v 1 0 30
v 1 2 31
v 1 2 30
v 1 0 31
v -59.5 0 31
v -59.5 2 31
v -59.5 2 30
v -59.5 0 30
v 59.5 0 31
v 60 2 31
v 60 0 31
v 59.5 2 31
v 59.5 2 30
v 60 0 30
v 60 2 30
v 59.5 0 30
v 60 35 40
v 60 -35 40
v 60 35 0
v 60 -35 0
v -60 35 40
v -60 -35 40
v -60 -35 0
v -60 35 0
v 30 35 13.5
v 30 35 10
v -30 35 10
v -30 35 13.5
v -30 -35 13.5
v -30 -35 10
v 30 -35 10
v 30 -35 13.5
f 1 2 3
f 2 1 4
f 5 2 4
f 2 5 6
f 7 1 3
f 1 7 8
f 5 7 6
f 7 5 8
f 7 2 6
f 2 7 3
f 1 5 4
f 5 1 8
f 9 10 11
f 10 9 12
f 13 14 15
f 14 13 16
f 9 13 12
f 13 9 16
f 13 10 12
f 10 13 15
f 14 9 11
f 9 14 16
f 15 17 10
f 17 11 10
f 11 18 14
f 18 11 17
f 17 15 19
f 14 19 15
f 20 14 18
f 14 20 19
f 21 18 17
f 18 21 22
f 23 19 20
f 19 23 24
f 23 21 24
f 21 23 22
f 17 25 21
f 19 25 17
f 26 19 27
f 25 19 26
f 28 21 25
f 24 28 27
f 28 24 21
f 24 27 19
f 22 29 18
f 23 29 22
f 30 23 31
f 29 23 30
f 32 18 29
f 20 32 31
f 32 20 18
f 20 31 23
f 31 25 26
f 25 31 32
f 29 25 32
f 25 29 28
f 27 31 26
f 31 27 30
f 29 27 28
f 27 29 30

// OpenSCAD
// Mini horizontal gel-electrophoresis box - buffer tank
// Print orientation: open top facing up (+Z), resting on XY plane at z = 0

// ---------------- Parameters ----------------
tank_x      = 120;   // outer length along X (mm)
tank_y      = 70;    // outer width along Y (mm)
tank_h      = 40;    // outer height along Z (mm)

wall        = 3;     // wall thickness (mm)
floor       = 3;     // floor thickness (mm)

platform_x  = 60;    // platform length along X (mm), centred
platform_y  = tank_y; // platform spans full inner width (mm)
platform_top = 13;   // platform top height above tank floor (mm)
// Note: platform_top is absolute height in the model (floor is at z = 0)

hole_d      = 2;     // electrode hole diameter (mm)
hole_y      = 0;     // electrode hole Y position (mm)
hole_z      = 30;    // electrode hole Z position (mm)

eps         = 0.5;   // cutter overshoot past faces (mm)

$fn = 96;

// ---------------- Derived ----------------
inner_x = tank_x - 2 * wall;   // inner length along X
inner_y = tank_y - 2 * wall;   // inner width along Y
// platform sits on the floor, centred along X, full width in Y

// ---------------- Model ----------------
difference() {
    // Main tank body (open top)
    translate([-tank_x / 2, -tank_y / 2, 0])
        cube([tank_x, tank_y, tank_h]);

    // Raised platform for gel tray
    translate([-platform_x / 2, -platform_y / 2, platform_top - floor])
        cube([platform_x, platform_y, floor + eps]);  // extends into tank

    // Horizontal electrode holes through each end wall, along X
    for (s = [-1, 1])
        translate([s * (tank_x / 2 - eps), hole_y, hole_z])
            cube([tank_x / 2 + eps, hole_d, 1]);  // runs through the end wall
}
